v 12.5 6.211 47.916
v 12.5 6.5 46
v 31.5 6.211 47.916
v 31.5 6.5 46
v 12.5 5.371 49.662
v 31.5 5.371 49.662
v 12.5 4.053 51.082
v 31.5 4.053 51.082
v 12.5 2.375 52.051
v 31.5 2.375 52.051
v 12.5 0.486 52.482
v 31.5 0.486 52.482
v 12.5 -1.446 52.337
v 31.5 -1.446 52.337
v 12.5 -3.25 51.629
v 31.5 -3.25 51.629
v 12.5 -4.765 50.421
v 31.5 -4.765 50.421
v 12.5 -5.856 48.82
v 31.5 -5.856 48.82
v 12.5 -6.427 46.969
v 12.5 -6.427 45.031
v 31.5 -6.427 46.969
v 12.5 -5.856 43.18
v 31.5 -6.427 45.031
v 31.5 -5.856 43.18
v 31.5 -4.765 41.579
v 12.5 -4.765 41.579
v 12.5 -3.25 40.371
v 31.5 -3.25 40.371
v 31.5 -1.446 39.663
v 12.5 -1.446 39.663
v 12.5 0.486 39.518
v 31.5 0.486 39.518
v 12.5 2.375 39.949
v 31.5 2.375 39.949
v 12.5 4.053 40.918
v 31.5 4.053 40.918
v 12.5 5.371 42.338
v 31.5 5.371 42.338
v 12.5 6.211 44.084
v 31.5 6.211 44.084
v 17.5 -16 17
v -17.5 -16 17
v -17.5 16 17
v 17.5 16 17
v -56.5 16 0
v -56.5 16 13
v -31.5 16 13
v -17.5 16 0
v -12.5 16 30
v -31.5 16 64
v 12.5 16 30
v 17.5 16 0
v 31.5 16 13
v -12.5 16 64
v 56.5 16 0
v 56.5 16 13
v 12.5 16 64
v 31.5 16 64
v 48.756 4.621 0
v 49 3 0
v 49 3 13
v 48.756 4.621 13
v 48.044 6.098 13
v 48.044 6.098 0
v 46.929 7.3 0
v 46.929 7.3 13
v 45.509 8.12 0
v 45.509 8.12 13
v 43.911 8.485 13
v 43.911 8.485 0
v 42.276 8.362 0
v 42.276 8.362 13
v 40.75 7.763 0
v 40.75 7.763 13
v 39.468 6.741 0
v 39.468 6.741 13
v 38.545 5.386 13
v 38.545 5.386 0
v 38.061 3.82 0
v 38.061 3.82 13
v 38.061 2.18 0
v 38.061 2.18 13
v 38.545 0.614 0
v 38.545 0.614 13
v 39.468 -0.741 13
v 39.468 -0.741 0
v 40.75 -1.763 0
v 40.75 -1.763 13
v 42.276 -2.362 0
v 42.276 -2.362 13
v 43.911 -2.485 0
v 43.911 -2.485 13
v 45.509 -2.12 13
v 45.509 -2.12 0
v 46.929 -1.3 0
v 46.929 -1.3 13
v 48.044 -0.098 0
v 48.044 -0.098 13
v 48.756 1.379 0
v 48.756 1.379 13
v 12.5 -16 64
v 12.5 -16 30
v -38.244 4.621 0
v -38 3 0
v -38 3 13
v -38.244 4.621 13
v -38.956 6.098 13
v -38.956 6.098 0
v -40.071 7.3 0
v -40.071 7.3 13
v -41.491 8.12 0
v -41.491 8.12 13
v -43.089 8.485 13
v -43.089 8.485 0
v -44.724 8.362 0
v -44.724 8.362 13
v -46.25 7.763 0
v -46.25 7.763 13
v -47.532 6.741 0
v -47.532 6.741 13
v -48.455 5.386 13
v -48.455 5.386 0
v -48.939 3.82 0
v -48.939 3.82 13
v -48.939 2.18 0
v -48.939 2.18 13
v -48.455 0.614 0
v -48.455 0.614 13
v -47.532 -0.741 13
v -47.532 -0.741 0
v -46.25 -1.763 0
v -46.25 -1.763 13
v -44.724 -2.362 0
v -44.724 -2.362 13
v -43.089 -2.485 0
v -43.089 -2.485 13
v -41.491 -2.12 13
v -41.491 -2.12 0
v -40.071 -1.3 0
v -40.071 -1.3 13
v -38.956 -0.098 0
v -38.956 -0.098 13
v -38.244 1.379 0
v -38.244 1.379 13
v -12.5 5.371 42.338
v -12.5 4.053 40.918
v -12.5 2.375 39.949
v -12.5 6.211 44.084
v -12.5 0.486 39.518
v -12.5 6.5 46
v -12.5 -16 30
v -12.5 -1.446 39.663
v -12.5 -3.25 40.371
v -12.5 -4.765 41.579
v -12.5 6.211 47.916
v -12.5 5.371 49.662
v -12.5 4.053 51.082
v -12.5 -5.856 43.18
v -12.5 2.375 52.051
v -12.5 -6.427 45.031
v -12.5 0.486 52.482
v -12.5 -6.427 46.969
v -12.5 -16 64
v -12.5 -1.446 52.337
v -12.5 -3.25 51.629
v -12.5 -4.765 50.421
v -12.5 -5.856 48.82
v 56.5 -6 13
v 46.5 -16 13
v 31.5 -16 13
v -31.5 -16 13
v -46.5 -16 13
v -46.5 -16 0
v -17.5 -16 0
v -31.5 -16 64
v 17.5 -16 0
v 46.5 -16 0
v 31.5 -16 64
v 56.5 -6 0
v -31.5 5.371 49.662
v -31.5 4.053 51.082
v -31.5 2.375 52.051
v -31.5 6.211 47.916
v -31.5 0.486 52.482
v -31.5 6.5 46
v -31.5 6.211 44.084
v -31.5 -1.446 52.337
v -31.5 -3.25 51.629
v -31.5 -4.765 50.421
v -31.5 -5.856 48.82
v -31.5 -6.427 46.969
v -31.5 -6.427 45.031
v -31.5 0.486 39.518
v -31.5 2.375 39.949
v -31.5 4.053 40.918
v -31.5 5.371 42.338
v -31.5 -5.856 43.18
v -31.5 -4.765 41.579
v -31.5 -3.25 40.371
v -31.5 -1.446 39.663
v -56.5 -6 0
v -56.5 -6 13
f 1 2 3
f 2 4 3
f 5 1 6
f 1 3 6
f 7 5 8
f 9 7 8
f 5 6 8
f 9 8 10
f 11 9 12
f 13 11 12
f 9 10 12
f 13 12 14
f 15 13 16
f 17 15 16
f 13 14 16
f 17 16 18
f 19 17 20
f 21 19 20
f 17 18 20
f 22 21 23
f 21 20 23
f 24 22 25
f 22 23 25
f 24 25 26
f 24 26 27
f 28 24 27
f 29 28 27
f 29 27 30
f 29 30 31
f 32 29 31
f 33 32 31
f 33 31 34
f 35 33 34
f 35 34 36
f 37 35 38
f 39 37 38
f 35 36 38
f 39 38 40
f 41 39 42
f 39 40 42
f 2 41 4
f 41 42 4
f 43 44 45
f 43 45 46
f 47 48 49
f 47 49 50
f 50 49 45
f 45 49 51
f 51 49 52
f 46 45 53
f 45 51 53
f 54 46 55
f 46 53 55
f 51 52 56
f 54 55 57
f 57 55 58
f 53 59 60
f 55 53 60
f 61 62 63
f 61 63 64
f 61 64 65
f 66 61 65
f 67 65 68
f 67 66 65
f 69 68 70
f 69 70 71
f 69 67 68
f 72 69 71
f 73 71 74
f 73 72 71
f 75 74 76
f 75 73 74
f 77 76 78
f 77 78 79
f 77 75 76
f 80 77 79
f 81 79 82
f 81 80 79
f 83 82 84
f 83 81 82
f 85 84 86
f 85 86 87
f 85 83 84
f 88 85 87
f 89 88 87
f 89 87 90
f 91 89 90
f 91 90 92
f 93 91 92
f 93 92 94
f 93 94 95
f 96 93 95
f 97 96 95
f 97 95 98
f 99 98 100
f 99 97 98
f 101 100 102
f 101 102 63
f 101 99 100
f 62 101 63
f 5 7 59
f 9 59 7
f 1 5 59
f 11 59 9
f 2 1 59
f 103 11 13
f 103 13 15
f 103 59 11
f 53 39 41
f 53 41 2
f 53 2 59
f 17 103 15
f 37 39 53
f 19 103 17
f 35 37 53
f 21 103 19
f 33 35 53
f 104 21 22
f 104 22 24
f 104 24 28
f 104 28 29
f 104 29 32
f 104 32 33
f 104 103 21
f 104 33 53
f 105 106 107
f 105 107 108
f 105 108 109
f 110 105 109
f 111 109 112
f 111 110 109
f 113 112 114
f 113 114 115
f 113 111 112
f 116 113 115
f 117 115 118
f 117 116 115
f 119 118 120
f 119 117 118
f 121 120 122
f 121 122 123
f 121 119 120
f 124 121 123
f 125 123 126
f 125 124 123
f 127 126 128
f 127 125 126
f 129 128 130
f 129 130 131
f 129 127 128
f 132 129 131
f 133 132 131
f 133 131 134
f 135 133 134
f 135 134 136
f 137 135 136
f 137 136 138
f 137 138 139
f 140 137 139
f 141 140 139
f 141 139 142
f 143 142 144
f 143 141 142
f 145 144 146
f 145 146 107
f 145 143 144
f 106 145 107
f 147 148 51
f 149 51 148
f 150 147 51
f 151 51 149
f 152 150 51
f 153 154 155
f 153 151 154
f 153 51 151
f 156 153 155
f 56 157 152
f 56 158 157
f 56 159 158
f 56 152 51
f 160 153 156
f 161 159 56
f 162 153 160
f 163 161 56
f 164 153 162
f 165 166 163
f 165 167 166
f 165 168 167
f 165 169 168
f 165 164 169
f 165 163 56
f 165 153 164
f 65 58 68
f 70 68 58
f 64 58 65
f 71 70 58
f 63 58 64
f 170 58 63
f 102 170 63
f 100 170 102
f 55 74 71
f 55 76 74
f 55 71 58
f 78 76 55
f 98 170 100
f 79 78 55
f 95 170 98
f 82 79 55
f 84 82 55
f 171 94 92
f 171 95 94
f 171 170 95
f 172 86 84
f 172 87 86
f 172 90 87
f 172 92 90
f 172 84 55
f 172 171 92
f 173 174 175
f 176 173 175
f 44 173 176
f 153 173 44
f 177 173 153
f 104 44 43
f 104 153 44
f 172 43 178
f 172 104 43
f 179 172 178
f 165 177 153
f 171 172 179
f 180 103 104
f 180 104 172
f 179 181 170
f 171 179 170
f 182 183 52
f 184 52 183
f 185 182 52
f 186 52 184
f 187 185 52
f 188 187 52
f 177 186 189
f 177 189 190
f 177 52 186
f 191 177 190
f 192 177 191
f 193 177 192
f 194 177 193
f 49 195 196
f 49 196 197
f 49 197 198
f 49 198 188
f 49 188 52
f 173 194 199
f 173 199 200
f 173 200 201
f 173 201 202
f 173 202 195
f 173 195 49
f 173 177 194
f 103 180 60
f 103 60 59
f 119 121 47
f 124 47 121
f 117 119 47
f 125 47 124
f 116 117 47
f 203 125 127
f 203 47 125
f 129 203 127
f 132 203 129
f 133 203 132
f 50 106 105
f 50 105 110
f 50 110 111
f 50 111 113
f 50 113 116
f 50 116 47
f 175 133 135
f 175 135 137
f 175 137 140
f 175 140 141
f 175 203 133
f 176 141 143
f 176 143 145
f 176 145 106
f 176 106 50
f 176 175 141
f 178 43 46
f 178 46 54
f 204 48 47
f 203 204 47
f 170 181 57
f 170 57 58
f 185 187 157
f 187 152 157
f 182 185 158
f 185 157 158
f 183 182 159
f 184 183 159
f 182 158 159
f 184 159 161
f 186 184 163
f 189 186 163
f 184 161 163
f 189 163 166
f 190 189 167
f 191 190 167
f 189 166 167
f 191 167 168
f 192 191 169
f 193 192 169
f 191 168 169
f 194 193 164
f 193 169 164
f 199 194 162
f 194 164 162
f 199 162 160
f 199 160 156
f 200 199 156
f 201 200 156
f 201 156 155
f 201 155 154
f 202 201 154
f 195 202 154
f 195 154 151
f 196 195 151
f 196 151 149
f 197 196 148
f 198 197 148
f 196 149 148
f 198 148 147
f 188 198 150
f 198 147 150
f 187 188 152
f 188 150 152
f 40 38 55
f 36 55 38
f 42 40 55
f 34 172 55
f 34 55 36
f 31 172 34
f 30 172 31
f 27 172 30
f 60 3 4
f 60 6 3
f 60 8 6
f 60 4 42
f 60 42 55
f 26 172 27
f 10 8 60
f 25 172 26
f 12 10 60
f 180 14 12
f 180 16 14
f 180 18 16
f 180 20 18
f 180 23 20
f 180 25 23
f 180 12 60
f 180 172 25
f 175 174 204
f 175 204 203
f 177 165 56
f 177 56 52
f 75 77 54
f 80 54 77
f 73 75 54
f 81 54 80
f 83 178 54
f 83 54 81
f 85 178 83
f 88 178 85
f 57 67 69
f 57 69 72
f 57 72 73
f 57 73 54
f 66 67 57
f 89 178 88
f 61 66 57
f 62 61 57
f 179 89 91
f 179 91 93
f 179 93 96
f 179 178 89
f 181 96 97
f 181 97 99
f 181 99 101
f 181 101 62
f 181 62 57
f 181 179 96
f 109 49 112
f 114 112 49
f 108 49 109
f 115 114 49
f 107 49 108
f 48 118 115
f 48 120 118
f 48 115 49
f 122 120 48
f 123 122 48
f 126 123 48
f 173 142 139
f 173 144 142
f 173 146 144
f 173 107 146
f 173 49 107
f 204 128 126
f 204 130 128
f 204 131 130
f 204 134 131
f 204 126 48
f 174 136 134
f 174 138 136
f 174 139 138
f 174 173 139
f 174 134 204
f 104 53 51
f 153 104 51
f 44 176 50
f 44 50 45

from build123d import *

# Parameters (mm, degrees)
F1_DEPTH = 16
F2_R     = 6.5
F3_DEPTH = 36.5
F4_R     = 5.5
F5_DEPTH = 13
F6_SIZE  = 10


with BuildPart() as f1:
    # F0 (on Front) → F1 (new body, symmetric)
    with BuildSketch(Plane.XZ):
        Polygon((-56.5, 13), (-56.5, 0), (-17.5, 0), (-17.5, 17), (17.5, 17), (17.5, 0), (56.5, 0), (56.5, 13), (31.5, 13), (31.5, 64), (12.5, 64), (12.5, 30), (-12.5, 30), (-12.5, 64), (-31.5, 64), (-31.5, 13), align=None)
    extrude(amount=F1_DEPTH, both=True)

    # F2 (on Right) → F3 (cut, symmetric)
    with BuildSketch(Plane.YZ):
        with Locations((0, 46)):
            Circle(F2_R)
    extrude(amount=F3_DEPTH, both=True, mode=Mode.SUBTRACT)

    # F4 (on Top) → F5 (cut)
    with BuildSketch(Plane.XY):
        with Locations((-43.5, 3)):
            Circle(F4_R)
        with Locations((43.5, 3)):
            Circle(F4_R)
    extrude(amount=F5_DEPTH, mode=Mode.SUBTRACT)

    # F6
    f6_edges = [f1.edges().sort_by_distance(p)[0] for p in [
        (56.5, -16, 6.5),
        (-56.5, -16, 6.5),
    ]]
    chamfer(f6_edges, length=F6_SIZE)


solid = f1.part
